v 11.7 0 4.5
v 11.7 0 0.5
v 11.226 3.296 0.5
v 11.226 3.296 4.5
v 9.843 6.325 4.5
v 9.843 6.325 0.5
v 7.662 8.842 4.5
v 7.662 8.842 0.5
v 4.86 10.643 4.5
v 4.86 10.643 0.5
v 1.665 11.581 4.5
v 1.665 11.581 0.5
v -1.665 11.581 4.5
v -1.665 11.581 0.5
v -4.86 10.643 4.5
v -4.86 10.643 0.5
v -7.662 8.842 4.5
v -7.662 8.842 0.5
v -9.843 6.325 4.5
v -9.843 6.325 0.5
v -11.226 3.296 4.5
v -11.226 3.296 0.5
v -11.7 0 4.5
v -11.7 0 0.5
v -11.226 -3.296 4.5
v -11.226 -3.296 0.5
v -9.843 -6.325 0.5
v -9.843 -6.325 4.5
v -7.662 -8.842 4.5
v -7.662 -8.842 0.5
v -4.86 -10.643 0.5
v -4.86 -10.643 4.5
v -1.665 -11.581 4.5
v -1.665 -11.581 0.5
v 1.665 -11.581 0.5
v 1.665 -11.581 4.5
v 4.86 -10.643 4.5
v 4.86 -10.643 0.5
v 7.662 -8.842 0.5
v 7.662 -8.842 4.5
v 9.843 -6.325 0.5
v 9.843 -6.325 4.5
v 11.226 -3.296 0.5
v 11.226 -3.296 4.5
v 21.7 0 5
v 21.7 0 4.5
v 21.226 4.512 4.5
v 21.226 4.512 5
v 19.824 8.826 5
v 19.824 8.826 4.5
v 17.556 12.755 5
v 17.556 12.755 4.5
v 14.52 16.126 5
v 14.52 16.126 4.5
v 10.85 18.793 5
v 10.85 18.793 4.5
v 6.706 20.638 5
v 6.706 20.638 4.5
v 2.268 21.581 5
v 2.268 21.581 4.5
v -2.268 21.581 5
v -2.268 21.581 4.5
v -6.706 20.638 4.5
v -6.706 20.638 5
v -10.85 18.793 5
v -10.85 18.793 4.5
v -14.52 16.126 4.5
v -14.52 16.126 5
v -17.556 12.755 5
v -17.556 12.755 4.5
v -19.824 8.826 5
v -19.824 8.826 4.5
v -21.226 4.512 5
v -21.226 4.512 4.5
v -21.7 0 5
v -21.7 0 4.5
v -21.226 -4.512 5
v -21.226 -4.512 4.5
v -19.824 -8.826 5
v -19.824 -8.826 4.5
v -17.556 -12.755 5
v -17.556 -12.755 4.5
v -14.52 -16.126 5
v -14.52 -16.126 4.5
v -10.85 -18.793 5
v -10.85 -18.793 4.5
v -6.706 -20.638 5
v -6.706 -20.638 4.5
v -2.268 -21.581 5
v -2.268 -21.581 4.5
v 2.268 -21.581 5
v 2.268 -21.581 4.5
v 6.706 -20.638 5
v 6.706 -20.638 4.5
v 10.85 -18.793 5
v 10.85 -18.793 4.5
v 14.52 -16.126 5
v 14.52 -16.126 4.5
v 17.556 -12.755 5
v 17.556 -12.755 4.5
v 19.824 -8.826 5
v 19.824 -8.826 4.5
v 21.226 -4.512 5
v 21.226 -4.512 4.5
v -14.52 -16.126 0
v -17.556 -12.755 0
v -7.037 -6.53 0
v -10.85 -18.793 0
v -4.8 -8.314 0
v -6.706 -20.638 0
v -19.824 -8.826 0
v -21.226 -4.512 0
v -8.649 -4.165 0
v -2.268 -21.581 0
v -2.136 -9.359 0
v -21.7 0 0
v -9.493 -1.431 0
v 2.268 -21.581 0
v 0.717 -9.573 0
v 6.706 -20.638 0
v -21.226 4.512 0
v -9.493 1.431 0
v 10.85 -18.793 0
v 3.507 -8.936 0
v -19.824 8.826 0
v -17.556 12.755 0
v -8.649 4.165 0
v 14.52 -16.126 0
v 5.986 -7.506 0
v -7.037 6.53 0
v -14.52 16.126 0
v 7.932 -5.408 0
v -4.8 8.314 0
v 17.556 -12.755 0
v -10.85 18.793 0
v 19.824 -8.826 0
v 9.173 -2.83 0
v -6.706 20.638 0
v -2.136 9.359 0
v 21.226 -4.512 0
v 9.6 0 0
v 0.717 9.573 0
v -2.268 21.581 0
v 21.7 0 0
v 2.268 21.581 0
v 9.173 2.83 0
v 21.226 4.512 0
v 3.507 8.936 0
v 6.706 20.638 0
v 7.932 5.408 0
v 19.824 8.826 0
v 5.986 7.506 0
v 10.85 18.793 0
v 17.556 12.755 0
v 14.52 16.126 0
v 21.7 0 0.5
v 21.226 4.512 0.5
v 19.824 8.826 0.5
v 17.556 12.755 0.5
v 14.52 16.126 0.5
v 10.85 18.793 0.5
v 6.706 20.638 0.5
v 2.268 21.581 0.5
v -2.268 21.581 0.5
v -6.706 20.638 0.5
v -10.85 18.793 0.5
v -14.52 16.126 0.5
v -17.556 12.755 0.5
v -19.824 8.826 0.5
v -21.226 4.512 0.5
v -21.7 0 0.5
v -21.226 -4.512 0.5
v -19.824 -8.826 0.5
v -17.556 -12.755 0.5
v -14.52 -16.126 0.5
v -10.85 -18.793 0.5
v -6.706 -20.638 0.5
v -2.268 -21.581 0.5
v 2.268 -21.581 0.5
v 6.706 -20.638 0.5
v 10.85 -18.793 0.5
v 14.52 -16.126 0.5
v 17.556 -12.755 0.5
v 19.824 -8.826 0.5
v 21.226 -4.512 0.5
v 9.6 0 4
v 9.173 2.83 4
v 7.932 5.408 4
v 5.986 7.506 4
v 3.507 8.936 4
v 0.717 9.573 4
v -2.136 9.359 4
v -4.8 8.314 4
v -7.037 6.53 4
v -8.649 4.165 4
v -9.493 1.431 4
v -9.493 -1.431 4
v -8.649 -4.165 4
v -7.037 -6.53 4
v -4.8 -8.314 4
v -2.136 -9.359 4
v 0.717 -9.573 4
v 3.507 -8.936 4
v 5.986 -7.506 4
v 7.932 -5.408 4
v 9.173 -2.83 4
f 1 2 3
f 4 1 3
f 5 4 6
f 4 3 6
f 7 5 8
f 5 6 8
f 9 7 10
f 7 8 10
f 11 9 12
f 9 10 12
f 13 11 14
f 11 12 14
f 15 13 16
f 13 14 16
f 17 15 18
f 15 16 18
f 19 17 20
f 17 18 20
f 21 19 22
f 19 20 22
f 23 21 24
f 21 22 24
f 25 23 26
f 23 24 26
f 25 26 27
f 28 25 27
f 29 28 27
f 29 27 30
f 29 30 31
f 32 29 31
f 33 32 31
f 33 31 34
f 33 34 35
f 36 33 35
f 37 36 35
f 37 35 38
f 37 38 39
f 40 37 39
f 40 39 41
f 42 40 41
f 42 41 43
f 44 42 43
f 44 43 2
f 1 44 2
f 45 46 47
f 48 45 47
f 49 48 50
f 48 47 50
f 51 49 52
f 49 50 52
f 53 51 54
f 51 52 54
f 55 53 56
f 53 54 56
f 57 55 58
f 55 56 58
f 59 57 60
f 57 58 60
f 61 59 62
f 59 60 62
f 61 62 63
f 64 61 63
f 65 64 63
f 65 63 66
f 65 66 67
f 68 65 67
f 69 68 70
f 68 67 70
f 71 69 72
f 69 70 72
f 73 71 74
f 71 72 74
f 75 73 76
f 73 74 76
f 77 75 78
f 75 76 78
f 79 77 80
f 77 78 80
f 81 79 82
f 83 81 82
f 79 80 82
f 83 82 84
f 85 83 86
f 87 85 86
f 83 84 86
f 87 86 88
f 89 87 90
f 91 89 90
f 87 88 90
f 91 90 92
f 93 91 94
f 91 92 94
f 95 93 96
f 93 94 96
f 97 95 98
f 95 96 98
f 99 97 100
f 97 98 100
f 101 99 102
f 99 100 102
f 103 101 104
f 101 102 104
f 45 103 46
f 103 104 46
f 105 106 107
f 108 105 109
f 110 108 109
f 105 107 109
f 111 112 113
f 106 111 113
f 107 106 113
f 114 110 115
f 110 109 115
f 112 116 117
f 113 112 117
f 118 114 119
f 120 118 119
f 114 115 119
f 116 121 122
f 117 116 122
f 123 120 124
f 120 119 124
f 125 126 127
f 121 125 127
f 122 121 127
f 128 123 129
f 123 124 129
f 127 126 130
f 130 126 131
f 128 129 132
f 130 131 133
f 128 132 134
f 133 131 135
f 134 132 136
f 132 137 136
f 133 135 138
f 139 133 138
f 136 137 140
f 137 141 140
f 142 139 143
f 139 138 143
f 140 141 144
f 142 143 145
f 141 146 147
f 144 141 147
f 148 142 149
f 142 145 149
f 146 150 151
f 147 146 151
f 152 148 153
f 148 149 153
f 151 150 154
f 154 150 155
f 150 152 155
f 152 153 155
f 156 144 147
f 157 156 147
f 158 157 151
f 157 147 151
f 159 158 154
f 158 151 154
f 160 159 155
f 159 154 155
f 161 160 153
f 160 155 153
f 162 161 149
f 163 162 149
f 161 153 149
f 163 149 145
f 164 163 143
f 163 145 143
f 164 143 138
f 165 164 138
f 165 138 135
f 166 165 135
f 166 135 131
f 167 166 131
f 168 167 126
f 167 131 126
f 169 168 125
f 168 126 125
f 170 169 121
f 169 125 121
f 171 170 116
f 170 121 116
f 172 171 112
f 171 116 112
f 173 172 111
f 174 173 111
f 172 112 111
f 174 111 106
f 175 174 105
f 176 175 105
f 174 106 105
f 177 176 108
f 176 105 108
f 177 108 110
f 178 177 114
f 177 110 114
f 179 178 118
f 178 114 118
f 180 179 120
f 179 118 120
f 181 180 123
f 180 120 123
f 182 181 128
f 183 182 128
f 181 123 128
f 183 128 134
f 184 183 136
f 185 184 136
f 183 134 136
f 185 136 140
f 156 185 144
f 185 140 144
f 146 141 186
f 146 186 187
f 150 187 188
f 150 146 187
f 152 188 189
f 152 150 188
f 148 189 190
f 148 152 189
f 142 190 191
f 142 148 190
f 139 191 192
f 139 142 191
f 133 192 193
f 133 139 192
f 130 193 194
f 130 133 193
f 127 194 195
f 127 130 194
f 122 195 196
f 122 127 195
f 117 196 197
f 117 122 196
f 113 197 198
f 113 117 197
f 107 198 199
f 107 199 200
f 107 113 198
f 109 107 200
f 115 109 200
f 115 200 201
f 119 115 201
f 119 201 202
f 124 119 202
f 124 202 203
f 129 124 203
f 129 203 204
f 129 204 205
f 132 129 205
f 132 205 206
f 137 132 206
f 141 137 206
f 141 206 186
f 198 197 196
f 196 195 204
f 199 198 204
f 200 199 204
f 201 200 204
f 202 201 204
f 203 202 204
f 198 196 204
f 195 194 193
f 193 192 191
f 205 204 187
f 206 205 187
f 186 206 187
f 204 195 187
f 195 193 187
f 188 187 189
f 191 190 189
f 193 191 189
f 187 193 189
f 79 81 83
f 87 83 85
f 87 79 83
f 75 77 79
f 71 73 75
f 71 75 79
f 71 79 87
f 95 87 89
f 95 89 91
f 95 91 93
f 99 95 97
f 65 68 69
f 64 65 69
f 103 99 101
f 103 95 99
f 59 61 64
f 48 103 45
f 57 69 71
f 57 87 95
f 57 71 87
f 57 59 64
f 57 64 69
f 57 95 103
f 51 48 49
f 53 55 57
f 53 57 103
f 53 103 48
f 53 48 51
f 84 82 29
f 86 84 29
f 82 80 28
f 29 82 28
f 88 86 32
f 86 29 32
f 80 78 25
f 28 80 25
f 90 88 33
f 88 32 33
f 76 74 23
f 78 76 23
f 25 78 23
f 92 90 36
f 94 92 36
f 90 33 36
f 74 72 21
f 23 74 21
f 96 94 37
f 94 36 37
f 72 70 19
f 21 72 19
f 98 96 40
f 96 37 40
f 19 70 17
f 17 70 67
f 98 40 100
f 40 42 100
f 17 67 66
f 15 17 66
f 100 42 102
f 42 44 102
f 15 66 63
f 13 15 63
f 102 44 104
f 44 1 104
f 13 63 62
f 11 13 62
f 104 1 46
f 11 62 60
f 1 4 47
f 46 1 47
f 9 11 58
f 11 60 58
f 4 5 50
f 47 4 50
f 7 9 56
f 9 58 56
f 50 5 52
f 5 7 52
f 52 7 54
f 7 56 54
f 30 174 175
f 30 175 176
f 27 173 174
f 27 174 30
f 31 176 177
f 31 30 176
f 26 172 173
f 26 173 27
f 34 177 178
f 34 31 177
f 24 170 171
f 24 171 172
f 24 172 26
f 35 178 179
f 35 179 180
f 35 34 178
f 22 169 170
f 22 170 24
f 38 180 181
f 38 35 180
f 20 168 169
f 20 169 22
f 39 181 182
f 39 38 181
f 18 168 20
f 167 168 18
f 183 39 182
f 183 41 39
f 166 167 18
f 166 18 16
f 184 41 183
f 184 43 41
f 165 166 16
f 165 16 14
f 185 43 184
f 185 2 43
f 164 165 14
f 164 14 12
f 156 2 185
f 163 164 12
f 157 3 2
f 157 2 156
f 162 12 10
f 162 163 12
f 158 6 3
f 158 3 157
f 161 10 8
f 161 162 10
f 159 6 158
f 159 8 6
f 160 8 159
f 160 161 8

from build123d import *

# Parameters (mm, degrees)
F0_R     = 11.7
F0_R_2   = 9.6
F1_DEPTH = 5
F0_R_3   = 21.7
F2_DEPTH = 0.5
F3_START = 4.5
F3_DEPTH = 0.5
F4_START = 4
F4_DEPTH = 1


with BuildPart() as f1:
    # F0 (on Top) → F1 (new body)
    with BuildSketch(Plane.XY):
        Circle(F0_R)
        Circle(F0_R_2, mode=Mode.SUBTRACT)
    extrude(amount=F1_DEPTH)

    # F0 (on Top) → F2 (join)
    with BuildSketch(Plane.XY):
        Circle(F0_R_3)
        Circle(F0_R, mode=Mode.SUBTRACT)
    extrude(amount=F2_DEPTH)

    # F0 (on Top) → F3 (join)
    with BuildSketch(Plane.XY.offset(F3_START)):
        Circle(F0_R_3)
        Circle(F0_R, mode=Mode.SUBTRACT)
    extrude(amount=F3_DEPTH)

    # F0 (on Top) → F4 (join)
    with BuildSketch(Plane.XY.offset(F4_START)):
        Circle(F0_R_2)
    extrude(amount=F4_DEPTH)


solid = f1.part
